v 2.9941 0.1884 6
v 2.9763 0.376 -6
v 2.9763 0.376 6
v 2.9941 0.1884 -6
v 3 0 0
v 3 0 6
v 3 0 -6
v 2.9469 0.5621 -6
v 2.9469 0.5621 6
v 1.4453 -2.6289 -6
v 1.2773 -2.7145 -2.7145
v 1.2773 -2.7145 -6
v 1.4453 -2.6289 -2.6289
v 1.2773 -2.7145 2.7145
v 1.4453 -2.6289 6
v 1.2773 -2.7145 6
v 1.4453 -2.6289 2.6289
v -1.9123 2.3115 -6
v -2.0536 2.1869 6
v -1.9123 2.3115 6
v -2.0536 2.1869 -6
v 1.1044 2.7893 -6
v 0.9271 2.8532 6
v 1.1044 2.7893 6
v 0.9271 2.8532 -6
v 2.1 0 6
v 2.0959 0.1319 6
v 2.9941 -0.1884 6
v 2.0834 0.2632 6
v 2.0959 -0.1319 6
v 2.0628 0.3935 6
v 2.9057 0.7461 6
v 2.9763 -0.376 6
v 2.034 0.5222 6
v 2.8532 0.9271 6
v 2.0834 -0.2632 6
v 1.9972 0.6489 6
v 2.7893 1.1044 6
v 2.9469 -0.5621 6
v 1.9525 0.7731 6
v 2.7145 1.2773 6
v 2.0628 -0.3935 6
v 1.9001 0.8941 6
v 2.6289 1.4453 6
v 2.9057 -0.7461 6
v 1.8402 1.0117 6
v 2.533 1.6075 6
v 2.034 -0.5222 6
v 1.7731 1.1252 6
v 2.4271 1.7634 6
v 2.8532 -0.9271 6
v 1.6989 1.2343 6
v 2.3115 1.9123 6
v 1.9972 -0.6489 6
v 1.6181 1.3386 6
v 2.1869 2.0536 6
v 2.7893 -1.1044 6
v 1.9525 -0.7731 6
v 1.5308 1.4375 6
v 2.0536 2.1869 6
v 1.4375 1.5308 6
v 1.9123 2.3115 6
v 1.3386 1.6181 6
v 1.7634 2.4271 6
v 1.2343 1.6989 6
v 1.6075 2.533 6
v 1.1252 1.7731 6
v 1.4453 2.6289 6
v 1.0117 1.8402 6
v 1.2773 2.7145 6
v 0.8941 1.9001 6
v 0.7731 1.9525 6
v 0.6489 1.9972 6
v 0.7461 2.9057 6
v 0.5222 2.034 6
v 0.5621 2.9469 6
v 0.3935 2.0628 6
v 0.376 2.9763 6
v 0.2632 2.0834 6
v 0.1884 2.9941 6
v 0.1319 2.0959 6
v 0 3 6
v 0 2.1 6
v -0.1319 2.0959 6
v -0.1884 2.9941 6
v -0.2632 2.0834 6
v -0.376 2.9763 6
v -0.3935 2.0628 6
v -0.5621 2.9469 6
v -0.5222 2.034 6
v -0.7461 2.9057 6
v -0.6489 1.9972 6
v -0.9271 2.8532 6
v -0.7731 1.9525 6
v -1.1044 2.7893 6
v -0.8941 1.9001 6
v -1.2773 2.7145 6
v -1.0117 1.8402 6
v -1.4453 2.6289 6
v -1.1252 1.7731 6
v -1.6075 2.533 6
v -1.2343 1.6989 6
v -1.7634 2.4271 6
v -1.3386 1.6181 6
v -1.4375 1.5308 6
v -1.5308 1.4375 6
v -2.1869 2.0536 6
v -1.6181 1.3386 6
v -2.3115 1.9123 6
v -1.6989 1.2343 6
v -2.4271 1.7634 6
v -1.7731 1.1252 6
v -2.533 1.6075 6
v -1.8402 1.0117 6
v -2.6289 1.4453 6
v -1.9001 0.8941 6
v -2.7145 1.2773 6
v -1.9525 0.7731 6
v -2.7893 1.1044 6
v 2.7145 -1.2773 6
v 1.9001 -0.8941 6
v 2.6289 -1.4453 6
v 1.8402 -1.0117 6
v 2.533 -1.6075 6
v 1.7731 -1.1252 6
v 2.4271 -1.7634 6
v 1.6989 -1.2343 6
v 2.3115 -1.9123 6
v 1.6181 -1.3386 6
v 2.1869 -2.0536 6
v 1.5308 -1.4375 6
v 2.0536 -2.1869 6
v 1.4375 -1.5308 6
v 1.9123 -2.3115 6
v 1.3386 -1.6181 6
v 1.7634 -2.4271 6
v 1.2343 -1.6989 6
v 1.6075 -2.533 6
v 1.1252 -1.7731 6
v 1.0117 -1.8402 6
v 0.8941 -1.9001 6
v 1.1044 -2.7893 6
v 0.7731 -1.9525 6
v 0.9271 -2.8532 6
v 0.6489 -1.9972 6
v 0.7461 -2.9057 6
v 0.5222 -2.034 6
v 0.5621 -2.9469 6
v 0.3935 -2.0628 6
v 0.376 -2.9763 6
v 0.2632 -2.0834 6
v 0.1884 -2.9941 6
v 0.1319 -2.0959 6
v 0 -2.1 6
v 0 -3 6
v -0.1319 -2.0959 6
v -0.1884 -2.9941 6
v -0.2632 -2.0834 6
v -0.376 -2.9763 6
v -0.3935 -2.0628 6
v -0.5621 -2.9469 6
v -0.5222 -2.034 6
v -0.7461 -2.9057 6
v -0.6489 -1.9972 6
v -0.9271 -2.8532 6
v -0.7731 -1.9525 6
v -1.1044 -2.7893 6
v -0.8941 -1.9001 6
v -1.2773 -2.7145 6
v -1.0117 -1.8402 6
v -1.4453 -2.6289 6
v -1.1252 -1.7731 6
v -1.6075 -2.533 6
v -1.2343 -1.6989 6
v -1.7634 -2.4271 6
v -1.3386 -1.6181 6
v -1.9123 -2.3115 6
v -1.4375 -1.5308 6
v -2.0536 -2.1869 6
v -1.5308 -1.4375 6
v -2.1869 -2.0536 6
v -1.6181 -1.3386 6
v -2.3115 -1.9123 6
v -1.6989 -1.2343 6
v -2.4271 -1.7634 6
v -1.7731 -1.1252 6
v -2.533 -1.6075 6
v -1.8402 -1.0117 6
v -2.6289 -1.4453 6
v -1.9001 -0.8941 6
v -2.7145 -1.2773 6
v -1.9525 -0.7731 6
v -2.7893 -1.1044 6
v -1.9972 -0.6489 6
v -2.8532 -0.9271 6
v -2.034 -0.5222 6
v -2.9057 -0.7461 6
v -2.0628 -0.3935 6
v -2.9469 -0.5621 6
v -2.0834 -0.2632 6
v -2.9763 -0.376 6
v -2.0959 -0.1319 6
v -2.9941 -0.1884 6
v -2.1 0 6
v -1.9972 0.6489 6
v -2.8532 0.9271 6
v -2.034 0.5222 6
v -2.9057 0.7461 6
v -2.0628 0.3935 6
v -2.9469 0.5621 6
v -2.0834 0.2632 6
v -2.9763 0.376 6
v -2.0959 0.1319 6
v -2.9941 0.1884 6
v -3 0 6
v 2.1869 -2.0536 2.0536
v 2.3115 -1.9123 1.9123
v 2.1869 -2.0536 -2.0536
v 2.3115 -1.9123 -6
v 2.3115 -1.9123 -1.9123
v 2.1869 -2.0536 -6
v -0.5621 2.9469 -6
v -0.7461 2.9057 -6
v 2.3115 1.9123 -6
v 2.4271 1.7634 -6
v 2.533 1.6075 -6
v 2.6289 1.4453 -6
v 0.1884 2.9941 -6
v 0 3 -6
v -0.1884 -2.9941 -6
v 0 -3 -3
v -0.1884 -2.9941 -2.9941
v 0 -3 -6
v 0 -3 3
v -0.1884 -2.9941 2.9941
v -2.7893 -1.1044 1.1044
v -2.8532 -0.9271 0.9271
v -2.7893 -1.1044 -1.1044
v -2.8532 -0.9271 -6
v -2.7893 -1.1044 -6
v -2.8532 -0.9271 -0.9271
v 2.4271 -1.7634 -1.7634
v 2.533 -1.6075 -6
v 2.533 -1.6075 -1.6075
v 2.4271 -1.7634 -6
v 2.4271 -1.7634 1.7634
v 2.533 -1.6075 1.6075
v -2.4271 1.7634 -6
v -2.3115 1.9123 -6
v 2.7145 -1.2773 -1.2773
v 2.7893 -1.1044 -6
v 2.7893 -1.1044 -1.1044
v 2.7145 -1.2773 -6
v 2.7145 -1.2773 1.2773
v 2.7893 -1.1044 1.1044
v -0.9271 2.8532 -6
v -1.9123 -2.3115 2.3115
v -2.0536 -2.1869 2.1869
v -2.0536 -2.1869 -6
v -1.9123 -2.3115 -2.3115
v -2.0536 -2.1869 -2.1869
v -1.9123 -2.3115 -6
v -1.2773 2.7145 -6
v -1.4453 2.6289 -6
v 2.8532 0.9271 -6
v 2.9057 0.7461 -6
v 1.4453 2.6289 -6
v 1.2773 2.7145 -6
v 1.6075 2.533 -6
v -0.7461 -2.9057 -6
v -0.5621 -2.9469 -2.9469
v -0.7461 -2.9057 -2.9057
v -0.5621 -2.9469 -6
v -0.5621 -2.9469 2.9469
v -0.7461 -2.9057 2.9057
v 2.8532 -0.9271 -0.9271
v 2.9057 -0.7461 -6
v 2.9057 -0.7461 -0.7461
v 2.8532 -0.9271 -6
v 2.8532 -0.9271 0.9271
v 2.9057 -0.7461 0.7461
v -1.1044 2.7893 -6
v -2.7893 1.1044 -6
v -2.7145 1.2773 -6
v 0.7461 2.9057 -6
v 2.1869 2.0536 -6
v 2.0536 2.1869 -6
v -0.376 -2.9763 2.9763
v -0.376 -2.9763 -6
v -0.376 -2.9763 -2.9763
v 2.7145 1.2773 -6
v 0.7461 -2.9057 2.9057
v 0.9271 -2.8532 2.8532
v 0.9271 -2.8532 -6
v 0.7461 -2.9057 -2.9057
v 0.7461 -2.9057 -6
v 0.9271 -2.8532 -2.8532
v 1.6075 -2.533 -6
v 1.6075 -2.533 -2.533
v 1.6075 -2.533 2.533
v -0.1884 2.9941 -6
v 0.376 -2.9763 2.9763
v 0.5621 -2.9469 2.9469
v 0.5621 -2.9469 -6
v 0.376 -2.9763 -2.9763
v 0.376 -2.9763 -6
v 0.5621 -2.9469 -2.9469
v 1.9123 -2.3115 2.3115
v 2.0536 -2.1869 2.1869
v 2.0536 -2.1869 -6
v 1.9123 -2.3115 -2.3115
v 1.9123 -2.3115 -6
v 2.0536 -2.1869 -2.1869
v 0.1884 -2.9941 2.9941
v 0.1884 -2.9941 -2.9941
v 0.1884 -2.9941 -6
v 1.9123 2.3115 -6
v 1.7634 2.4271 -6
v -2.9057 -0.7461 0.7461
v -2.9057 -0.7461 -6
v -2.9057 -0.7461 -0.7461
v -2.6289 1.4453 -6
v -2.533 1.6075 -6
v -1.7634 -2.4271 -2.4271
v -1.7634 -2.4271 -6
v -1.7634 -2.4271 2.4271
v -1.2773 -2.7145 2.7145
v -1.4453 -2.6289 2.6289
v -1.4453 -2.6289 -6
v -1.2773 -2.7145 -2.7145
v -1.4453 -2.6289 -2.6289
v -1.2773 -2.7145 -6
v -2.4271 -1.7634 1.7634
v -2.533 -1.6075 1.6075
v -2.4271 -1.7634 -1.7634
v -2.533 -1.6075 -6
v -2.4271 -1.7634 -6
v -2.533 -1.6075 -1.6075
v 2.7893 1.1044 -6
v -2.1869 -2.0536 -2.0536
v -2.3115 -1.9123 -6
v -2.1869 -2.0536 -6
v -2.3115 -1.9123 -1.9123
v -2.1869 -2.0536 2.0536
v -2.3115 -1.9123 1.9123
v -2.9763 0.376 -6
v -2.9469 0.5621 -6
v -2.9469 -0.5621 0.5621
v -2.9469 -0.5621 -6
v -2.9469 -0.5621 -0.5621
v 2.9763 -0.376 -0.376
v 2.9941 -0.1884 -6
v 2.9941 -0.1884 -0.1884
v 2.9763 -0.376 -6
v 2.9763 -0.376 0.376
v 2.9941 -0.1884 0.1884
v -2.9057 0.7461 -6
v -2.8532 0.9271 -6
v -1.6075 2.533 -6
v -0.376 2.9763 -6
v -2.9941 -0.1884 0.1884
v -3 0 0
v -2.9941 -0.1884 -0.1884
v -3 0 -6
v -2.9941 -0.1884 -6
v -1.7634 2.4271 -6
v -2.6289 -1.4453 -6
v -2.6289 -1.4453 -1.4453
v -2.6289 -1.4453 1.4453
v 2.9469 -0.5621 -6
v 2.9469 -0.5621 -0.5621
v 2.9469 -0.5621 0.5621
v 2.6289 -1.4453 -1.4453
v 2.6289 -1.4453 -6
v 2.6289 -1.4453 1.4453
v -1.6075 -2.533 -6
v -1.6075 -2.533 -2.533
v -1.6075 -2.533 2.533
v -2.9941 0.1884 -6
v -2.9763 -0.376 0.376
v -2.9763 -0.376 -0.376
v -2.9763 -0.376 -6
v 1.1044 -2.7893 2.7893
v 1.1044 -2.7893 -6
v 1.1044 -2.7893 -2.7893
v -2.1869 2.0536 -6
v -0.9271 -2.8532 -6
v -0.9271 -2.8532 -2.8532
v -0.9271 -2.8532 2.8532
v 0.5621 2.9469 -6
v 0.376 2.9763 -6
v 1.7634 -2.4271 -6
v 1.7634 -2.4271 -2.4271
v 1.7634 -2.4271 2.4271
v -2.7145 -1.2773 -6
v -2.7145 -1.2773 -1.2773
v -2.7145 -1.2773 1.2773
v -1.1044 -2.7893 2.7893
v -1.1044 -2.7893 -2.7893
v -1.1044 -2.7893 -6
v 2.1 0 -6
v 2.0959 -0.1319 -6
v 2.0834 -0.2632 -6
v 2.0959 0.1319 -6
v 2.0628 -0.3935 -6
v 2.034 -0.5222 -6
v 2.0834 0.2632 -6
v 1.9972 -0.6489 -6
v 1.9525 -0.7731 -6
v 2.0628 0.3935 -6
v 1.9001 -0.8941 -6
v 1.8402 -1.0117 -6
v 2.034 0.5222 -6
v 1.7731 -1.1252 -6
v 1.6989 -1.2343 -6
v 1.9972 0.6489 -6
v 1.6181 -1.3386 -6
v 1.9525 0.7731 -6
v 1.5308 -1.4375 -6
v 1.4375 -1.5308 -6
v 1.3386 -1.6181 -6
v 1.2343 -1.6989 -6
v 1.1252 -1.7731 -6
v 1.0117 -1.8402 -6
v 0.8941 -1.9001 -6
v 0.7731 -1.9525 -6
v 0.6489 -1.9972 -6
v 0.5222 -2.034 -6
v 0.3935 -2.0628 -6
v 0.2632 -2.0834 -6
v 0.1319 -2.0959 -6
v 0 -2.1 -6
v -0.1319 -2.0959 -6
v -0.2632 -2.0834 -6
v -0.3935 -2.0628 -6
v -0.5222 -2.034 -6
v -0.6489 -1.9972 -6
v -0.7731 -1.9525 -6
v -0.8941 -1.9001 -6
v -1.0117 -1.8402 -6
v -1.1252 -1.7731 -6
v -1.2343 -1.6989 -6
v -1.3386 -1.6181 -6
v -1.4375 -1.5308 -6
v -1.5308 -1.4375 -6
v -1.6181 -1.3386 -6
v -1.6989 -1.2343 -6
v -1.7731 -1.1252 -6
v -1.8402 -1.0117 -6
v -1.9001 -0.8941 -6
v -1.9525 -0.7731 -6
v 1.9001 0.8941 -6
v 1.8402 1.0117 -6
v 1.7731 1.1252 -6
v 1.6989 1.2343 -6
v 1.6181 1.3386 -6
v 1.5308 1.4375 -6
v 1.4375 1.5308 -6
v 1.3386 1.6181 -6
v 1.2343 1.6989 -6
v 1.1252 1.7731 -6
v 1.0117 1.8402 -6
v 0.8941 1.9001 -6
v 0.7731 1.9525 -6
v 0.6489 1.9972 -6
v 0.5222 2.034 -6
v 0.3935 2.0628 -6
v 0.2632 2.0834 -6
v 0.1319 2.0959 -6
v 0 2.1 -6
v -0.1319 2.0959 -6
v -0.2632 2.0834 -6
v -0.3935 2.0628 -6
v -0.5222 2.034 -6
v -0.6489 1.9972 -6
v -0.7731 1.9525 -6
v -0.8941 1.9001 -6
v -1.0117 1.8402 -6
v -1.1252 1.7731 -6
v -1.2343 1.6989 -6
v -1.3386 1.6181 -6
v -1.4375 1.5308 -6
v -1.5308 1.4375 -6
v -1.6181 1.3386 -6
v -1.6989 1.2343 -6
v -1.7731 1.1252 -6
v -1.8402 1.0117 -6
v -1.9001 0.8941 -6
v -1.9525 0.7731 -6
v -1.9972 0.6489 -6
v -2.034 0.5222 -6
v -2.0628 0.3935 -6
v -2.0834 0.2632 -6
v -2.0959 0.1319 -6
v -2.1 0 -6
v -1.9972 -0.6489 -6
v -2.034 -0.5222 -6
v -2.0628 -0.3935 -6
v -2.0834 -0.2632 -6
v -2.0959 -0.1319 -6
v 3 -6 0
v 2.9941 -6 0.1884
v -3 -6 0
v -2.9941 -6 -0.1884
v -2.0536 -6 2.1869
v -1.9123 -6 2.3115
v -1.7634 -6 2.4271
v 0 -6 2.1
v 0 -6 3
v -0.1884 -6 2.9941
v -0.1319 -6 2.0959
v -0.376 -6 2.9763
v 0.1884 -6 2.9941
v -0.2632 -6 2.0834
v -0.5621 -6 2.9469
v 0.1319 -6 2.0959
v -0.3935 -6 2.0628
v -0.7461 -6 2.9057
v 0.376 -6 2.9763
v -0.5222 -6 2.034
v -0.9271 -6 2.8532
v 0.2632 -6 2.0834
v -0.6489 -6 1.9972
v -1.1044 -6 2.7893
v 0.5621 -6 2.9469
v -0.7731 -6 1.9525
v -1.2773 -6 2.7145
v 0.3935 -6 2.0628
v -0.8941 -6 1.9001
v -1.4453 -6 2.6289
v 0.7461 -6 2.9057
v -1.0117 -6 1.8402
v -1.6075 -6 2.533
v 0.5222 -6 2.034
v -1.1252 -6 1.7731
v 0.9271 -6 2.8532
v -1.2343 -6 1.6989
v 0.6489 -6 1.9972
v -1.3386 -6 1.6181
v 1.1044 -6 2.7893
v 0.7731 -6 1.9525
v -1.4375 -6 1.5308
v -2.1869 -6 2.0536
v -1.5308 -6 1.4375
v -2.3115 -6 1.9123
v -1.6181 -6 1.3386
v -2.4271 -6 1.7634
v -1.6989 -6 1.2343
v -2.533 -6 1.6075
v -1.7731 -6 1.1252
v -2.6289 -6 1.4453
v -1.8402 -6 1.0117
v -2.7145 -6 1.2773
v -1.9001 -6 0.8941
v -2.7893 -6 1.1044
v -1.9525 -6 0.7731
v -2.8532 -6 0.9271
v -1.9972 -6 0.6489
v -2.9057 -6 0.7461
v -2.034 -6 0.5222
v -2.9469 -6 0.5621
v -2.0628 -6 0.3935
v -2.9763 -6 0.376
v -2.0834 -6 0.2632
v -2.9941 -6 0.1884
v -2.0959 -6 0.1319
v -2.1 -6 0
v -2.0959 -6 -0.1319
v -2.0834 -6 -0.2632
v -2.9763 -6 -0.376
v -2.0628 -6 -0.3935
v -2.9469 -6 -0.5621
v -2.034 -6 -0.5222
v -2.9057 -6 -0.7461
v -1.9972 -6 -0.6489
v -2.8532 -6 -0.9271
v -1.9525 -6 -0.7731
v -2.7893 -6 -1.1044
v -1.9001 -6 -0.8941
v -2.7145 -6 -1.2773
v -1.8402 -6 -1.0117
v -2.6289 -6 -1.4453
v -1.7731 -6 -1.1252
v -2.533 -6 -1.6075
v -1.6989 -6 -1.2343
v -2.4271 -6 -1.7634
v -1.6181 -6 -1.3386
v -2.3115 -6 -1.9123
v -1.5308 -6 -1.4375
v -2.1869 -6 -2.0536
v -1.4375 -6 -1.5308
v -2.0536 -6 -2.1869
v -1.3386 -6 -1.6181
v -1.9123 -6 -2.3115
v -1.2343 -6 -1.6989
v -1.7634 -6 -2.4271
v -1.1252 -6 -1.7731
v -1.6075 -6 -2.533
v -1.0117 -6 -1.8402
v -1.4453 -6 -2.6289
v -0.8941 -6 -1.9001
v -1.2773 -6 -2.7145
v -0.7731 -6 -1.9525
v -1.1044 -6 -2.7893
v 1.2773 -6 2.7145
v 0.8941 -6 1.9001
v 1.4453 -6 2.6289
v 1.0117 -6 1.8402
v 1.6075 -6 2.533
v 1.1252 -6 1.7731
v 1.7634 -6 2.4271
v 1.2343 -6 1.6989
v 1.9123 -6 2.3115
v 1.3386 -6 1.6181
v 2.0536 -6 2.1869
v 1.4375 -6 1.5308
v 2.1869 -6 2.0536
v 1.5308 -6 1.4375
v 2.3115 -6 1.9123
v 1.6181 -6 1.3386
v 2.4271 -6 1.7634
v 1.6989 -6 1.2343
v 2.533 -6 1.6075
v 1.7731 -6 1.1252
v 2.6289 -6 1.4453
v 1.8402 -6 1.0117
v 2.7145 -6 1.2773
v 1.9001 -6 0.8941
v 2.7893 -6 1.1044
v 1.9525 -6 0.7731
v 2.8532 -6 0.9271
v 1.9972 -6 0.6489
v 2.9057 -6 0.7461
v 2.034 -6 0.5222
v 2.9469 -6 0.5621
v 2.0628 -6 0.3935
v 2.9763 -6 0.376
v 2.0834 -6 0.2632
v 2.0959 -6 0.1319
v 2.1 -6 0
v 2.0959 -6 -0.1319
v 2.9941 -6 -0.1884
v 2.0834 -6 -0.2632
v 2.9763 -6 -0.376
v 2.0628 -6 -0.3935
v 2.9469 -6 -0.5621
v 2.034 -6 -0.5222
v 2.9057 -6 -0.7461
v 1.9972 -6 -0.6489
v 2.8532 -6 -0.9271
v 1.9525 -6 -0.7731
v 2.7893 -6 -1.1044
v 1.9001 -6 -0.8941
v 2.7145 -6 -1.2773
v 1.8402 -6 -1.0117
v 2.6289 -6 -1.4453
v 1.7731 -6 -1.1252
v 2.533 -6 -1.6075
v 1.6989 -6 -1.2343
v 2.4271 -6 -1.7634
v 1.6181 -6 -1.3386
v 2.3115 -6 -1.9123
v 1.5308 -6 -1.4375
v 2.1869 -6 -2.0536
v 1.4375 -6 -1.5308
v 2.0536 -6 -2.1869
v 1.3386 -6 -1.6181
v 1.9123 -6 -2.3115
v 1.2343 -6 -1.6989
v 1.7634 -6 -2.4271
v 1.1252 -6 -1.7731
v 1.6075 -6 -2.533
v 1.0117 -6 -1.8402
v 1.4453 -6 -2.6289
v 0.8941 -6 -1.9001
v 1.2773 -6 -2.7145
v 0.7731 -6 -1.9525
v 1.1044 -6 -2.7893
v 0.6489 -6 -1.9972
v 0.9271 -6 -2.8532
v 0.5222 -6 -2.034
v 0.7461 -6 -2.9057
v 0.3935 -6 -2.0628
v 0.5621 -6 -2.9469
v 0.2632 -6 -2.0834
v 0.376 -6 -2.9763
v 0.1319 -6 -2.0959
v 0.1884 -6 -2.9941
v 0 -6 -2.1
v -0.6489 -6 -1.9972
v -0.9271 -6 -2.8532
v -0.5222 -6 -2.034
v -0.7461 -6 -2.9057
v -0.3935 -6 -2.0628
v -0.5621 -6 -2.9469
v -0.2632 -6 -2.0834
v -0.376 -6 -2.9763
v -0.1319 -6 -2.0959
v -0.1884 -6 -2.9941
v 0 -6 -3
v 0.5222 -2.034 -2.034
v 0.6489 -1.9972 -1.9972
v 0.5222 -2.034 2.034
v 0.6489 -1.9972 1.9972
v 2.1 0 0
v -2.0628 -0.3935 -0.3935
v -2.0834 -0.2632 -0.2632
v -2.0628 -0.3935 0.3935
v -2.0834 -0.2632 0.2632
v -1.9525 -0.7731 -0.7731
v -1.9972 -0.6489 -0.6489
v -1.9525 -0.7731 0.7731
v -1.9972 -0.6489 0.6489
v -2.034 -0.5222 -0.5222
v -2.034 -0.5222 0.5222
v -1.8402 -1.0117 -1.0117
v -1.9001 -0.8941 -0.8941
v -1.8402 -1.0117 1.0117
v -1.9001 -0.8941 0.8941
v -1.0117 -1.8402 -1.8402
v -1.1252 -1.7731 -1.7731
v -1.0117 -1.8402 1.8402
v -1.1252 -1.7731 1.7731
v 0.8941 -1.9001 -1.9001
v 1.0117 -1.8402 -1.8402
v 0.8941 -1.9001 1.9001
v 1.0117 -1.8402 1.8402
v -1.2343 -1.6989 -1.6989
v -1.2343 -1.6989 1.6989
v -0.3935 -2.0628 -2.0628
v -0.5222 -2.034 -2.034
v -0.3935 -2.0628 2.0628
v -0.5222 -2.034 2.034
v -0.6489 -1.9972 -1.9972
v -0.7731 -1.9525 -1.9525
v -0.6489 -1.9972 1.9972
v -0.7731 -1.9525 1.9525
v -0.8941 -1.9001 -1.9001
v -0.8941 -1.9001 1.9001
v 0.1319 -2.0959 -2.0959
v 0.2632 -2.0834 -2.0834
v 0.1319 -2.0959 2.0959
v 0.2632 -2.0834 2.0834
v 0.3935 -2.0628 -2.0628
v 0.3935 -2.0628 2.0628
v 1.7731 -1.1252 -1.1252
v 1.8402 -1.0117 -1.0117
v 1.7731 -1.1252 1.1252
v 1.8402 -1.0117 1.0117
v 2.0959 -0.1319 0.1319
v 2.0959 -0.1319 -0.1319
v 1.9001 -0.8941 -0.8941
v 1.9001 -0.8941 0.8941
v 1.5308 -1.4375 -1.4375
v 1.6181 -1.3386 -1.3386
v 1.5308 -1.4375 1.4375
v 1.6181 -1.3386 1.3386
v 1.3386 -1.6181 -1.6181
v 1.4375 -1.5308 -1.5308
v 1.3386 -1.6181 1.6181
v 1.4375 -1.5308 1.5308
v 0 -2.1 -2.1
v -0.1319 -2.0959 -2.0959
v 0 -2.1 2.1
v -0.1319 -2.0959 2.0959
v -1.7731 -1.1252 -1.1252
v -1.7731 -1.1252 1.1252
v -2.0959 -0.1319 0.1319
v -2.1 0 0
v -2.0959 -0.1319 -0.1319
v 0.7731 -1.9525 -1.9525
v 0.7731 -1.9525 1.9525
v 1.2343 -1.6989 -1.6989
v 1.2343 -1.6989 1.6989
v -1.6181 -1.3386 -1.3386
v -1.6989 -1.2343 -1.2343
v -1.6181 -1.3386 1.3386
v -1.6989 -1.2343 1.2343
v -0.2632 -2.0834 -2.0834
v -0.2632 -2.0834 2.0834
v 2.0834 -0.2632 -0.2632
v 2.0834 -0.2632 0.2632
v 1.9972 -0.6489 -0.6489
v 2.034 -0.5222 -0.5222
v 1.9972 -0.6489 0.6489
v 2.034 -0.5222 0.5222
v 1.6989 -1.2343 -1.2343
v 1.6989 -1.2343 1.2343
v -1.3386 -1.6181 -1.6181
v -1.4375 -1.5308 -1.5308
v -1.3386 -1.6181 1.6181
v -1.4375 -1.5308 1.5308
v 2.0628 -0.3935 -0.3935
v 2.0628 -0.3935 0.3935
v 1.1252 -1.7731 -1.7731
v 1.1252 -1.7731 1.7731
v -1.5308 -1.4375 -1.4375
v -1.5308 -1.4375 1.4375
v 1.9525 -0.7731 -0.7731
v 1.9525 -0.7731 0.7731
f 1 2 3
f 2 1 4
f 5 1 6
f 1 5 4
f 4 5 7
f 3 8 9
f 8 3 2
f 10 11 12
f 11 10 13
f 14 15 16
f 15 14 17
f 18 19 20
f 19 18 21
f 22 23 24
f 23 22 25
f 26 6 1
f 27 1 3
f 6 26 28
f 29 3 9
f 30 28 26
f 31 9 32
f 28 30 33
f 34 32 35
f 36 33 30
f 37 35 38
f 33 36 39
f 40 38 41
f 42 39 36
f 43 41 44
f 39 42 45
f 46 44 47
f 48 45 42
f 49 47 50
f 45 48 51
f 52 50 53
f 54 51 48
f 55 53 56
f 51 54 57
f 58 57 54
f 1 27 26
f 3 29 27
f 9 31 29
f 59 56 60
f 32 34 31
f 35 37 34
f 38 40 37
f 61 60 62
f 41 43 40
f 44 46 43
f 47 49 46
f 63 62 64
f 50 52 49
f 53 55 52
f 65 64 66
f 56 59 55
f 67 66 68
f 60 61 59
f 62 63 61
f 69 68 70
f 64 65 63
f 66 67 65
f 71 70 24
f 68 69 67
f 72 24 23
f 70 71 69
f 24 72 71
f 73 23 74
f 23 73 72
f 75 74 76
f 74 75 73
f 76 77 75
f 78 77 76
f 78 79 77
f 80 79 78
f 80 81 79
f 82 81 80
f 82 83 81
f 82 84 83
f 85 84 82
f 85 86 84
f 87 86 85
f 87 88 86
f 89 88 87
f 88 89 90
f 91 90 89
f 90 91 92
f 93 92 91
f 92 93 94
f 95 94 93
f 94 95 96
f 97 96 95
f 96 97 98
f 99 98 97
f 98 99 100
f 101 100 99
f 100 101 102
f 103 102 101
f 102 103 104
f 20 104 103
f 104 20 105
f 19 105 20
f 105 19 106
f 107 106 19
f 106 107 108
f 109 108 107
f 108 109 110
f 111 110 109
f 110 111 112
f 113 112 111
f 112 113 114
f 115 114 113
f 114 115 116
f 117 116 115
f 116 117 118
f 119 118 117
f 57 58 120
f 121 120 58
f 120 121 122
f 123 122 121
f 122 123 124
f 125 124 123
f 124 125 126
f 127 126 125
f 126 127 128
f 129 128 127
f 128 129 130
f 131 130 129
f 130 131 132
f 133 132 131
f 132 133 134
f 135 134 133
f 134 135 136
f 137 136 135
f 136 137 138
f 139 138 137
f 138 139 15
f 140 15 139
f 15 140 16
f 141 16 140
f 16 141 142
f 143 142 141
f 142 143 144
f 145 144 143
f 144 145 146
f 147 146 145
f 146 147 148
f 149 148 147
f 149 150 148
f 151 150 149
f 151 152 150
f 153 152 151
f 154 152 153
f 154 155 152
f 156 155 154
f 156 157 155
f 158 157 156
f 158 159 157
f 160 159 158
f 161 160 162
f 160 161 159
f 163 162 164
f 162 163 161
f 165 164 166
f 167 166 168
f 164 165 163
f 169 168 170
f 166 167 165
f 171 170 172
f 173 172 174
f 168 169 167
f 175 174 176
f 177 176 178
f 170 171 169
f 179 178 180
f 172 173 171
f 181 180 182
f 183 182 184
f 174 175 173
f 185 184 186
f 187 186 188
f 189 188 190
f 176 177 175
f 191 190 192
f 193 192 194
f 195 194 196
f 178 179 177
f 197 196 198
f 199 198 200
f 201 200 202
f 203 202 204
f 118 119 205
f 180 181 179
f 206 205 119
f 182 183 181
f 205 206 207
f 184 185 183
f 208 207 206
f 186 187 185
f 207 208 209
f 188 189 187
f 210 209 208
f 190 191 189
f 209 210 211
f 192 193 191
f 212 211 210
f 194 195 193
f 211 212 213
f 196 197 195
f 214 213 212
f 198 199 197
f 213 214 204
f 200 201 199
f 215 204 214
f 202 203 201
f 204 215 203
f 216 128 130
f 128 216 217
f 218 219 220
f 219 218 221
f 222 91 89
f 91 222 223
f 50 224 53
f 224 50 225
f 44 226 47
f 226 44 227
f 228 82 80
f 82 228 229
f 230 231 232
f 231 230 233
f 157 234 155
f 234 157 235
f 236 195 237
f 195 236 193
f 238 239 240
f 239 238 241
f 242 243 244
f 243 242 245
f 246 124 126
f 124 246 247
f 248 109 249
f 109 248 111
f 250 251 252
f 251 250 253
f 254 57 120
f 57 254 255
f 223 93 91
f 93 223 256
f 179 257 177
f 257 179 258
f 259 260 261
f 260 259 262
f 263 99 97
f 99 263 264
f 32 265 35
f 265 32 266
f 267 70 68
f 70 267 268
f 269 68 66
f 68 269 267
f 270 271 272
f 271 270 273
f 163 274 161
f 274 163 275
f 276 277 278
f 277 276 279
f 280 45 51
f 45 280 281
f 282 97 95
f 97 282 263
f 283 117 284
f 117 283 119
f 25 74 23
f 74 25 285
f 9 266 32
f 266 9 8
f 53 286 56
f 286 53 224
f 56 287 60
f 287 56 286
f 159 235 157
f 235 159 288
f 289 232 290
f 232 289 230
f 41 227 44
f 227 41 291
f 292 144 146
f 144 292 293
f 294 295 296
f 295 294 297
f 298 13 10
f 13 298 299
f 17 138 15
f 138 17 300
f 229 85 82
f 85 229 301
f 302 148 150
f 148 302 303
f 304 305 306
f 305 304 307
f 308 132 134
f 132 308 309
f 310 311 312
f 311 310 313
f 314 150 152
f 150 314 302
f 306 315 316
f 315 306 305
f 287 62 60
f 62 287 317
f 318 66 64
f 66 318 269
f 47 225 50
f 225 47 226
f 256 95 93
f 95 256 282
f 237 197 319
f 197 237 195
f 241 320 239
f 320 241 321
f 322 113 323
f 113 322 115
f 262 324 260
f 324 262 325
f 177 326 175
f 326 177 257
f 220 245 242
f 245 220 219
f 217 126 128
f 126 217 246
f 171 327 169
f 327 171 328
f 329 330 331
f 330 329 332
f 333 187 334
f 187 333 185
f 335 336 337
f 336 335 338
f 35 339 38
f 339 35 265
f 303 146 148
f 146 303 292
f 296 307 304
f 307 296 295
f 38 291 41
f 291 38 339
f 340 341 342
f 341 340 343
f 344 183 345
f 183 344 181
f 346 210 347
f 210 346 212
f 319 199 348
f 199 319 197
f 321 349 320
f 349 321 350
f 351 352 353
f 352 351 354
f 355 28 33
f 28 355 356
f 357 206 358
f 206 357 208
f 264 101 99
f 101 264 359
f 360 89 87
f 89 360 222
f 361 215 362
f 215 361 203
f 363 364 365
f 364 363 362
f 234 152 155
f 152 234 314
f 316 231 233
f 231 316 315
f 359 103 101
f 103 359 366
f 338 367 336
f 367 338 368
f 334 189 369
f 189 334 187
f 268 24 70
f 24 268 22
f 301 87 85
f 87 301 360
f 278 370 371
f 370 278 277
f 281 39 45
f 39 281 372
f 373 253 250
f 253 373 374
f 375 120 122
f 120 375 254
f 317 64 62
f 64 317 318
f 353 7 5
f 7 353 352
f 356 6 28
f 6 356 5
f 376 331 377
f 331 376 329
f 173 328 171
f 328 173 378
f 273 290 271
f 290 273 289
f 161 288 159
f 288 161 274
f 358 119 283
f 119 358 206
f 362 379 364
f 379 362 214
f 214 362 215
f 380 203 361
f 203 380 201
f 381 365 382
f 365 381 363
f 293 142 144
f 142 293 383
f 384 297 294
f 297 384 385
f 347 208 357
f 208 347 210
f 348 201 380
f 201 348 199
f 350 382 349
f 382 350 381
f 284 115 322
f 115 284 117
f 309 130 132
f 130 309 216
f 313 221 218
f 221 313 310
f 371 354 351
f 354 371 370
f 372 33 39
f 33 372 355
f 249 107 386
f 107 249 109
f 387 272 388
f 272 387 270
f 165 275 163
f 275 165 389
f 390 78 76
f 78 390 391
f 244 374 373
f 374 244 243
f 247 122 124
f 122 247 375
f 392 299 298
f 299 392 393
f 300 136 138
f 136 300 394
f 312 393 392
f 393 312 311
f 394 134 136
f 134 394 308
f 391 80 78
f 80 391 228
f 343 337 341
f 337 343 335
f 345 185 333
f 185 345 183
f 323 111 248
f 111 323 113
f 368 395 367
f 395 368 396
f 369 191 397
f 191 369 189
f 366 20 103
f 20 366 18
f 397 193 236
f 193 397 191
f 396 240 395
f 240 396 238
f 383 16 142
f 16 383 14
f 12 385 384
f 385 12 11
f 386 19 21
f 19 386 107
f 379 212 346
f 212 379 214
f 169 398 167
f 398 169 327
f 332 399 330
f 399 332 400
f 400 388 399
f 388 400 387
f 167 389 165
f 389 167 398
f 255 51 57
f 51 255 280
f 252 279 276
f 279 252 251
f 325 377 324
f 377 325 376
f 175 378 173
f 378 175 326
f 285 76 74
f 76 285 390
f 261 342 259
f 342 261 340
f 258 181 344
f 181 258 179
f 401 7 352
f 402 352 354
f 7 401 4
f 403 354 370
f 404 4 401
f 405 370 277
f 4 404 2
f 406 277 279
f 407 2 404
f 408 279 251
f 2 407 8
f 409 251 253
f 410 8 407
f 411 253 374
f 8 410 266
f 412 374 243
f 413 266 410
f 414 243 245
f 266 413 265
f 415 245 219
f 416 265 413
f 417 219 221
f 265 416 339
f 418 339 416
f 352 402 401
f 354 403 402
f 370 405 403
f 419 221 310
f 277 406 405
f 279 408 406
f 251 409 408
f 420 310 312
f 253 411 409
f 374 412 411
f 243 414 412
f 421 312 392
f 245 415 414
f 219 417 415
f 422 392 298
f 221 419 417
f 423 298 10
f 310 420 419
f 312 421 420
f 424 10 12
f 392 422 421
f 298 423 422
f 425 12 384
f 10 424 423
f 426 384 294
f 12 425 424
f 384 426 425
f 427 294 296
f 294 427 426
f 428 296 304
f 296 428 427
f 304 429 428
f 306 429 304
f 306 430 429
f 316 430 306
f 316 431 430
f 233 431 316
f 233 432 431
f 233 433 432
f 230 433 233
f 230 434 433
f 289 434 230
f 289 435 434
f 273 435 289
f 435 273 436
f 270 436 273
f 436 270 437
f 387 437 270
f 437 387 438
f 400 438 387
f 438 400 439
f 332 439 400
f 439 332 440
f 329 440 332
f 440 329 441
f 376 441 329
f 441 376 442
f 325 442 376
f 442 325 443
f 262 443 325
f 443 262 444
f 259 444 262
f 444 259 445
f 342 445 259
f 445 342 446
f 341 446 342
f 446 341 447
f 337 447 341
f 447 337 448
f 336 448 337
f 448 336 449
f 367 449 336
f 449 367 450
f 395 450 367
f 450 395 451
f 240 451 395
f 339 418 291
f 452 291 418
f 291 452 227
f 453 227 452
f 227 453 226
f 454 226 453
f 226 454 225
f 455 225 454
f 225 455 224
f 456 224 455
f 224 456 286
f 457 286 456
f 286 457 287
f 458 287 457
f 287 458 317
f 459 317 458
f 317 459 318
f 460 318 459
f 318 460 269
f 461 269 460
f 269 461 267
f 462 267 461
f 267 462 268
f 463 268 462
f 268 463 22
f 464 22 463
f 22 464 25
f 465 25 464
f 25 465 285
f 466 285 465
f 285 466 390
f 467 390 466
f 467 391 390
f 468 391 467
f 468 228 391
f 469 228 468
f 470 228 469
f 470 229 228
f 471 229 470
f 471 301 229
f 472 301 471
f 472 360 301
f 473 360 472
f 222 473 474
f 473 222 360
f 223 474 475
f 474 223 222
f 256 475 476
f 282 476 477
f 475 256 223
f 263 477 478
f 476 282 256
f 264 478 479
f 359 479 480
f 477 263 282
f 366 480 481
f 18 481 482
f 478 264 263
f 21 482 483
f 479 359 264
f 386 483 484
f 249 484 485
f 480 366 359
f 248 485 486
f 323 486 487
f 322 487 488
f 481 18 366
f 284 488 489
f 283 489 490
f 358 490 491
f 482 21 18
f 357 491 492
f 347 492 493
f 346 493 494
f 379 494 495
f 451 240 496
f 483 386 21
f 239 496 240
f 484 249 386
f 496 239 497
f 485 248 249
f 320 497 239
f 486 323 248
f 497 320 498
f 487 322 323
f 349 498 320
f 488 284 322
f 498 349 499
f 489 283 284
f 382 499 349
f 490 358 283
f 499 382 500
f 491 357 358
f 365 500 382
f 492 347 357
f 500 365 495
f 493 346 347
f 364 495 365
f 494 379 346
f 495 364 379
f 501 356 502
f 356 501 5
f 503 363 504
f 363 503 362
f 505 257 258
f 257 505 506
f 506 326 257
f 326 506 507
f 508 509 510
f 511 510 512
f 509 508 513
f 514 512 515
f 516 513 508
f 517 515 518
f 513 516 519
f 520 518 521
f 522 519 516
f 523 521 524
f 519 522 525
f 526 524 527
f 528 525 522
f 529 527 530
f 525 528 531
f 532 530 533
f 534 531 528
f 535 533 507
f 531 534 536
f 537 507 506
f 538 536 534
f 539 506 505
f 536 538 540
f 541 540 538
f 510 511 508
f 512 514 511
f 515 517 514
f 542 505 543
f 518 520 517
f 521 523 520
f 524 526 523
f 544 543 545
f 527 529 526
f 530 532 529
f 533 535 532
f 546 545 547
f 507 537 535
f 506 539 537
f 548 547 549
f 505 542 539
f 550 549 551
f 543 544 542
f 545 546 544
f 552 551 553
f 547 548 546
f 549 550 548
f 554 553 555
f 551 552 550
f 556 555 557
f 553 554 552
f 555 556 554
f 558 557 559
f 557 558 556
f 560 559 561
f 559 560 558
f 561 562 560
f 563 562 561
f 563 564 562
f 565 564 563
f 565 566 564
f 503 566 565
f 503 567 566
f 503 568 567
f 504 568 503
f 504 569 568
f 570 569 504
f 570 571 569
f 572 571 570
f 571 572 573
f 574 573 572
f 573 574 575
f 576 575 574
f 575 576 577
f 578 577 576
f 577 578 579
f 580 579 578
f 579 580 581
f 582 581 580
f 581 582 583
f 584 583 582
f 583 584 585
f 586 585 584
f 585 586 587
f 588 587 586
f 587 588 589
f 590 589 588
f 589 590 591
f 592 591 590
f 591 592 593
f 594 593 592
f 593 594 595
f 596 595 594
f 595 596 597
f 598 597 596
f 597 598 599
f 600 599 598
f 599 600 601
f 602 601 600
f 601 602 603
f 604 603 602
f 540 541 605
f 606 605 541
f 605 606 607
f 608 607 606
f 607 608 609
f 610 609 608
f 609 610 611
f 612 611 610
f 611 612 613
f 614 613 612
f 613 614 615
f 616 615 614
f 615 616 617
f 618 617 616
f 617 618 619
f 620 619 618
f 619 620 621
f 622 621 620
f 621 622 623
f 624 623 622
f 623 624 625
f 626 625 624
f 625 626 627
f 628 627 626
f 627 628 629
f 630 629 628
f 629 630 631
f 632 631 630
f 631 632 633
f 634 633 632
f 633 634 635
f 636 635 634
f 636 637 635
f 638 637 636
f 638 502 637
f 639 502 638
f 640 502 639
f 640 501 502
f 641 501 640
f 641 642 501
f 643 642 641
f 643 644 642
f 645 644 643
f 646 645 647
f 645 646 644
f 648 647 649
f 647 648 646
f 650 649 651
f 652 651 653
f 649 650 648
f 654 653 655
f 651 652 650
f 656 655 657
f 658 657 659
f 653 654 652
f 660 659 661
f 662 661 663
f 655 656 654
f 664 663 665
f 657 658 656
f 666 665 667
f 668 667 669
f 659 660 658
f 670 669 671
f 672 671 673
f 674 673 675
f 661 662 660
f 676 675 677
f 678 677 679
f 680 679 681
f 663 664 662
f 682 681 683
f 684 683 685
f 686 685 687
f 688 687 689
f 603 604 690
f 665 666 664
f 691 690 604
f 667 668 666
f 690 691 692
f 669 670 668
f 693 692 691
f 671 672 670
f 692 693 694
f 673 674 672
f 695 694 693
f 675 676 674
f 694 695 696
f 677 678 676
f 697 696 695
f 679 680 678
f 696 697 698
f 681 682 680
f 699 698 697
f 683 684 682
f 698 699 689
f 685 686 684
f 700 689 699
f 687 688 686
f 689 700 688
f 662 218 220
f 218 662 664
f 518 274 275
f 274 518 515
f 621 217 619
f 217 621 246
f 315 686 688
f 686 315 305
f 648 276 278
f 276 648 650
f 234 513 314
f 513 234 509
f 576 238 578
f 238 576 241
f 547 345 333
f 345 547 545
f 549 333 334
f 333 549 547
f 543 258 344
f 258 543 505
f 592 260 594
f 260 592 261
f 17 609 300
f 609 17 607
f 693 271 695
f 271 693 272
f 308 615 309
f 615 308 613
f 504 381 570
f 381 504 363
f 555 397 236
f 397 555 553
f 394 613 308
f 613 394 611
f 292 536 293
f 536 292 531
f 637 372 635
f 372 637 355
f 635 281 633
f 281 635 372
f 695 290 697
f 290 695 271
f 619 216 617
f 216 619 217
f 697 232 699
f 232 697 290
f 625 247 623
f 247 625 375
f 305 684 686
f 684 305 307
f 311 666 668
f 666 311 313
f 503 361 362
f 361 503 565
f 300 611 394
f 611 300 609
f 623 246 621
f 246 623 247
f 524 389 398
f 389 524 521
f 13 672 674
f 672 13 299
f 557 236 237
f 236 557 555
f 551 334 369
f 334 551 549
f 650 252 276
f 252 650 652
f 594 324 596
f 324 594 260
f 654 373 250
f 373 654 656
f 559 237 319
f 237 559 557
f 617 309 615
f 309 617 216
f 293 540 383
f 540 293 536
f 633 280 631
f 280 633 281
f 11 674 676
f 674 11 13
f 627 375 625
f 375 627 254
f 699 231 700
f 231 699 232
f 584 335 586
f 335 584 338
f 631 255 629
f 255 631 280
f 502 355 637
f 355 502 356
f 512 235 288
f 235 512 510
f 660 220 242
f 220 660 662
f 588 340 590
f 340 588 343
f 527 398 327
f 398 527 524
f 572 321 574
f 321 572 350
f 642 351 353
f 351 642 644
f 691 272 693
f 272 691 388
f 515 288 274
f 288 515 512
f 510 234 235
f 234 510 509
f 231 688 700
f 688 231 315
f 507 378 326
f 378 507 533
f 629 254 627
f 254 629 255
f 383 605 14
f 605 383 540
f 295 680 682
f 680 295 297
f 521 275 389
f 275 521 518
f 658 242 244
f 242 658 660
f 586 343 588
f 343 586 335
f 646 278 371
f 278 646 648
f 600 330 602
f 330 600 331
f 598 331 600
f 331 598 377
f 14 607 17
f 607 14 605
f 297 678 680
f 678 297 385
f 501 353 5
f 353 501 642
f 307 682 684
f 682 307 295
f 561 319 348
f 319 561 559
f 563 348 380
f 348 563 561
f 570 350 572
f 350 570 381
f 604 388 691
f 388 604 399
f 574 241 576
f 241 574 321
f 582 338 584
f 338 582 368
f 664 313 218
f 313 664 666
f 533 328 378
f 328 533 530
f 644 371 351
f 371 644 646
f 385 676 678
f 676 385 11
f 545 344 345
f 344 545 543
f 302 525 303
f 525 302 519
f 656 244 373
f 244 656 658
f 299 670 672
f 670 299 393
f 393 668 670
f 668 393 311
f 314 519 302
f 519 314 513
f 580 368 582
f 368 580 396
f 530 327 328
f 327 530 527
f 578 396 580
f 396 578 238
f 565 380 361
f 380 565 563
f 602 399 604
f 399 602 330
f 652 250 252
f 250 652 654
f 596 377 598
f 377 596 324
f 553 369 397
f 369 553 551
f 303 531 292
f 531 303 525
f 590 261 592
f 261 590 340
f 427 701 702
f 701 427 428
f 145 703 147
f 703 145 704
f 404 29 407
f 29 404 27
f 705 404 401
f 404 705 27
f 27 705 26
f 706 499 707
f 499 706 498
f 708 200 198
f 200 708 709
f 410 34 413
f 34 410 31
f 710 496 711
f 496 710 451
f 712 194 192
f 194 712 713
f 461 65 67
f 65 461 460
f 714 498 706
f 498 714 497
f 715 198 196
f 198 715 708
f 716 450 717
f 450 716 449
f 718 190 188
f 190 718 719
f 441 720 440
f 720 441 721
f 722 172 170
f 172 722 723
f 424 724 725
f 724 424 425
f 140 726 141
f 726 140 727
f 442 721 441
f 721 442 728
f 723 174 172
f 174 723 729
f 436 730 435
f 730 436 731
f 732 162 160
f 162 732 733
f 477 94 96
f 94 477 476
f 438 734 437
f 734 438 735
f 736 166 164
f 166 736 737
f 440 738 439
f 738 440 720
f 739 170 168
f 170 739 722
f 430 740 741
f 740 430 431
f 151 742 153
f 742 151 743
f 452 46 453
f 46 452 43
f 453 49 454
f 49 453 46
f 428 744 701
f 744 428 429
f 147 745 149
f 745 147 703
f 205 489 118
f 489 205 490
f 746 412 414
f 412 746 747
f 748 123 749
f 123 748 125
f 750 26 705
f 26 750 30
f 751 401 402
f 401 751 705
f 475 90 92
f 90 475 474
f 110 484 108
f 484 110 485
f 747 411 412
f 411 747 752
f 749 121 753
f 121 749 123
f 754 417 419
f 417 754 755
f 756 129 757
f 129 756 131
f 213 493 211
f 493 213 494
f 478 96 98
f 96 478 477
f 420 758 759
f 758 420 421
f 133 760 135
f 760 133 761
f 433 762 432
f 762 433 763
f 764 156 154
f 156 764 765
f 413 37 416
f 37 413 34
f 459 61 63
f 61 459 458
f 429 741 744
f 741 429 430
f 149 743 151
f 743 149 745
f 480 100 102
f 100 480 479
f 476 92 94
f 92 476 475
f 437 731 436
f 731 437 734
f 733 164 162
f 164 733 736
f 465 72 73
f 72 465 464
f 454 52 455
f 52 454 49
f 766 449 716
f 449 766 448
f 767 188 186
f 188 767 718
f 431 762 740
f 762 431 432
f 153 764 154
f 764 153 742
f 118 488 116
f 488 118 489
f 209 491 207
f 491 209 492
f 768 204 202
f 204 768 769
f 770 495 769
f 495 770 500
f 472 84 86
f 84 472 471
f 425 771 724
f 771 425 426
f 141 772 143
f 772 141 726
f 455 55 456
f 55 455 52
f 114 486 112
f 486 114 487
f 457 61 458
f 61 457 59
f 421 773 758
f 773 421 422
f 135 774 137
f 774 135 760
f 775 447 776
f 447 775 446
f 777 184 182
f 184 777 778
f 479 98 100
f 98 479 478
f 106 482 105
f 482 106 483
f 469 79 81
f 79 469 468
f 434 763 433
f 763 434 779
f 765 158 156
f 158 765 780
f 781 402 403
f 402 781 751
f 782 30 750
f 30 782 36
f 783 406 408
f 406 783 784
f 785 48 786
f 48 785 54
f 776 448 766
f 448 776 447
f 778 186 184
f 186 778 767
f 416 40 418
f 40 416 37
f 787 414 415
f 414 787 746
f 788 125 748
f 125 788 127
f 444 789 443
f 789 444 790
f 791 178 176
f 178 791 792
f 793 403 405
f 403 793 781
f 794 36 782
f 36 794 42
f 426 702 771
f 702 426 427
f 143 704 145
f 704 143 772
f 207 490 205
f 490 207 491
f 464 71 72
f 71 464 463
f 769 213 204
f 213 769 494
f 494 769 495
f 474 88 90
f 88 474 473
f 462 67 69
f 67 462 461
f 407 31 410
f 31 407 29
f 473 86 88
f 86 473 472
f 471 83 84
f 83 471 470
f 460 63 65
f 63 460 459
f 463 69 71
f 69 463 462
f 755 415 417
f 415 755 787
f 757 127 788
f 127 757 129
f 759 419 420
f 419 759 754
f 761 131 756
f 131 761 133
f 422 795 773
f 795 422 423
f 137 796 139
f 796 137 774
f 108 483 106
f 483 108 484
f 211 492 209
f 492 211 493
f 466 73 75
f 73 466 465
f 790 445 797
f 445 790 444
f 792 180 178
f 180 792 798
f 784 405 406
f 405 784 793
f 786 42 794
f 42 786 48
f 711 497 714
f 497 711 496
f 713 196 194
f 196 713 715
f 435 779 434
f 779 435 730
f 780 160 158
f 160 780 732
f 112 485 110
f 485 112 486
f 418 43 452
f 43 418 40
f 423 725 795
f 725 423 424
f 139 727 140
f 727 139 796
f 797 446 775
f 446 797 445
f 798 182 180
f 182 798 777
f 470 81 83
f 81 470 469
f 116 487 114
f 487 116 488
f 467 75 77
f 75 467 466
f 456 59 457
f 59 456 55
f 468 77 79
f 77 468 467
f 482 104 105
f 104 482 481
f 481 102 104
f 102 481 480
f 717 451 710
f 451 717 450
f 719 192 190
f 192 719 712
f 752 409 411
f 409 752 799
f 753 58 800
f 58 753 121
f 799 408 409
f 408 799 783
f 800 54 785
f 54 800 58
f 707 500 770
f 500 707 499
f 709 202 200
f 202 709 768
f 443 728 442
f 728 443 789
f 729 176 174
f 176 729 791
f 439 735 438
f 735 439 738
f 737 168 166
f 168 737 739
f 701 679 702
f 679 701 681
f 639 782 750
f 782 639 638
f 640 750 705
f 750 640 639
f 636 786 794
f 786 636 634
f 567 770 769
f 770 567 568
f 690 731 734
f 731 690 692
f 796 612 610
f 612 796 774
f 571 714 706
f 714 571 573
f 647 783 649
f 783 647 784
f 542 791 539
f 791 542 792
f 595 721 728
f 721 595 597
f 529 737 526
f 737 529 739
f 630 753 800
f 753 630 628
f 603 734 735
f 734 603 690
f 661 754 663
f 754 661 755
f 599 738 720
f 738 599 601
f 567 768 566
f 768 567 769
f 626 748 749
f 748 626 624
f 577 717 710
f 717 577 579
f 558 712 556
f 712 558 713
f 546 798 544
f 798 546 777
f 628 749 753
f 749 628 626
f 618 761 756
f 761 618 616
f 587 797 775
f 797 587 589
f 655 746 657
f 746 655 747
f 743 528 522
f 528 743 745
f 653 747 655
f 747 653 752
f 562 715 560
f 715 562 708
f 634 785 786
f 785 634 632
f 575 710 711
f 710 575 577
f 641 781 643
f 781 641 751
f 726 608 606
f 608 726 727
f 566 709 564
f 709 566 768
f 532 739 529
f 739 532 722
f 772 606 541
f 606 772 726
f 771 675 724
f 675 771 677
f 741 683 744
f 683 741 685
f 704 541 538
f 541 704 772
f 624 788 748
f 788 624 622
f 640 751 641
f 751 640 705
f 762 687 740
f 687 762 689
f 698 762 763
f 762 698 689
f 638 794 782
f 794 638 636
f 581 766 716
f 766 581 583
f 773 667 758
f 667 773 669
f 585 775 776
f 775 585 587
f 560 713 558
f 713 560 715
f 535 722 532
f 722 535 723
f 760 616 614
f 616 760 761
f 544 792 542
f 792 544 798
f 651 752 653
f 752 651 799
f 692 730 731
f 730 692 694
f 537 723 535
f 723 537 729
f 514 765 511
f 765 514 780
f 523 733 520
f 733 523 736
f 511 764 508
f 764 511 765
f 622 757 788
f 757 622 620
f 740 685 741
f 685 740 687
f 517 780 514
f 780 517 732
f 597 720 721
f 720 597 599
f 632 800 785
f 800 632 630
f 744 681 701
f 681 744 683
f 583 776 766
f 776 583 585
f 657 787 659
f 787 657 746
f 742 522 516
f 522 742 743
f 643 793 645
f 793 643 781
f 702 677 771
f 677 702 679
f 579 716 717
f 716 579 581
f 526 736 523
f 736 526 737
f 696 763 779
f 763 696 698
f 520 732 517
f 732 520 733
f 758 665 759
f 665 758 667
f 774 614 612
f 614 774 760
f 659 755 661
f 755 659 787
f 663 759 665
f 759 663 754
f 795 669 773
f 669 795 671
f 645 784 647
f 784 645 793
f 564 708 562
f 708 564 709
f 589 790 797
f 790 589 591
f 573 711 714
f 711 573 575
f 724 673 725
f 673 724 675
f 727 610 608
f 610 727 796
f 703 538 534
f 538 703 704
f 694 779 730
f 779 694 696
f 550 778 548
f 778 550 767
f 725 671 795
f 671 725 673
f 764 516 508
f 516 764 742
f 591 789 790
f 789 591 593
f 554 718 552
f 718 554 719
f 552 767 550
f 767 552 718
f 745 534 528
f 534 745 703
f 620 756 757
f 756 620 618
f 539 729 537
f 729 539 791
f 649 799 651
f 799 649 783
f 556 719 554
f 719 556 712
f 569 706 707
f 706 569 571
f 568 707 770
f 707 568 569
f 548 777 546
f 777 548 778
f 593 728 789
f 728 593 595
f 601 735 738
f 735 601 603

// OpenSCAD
$fn = 100;
module tangle(hc, rc) {
        cylinder(h=2*hc, r = rc, center = true);
        rotate([90, 0, 0])
        cylinder(h=hc, r = rc);
    }

hc = 6;
rc = 3;
th = 0.9;    
difference(){
    tangle(hc, rc);
    tangle(hc+th, rc-th);
}   
